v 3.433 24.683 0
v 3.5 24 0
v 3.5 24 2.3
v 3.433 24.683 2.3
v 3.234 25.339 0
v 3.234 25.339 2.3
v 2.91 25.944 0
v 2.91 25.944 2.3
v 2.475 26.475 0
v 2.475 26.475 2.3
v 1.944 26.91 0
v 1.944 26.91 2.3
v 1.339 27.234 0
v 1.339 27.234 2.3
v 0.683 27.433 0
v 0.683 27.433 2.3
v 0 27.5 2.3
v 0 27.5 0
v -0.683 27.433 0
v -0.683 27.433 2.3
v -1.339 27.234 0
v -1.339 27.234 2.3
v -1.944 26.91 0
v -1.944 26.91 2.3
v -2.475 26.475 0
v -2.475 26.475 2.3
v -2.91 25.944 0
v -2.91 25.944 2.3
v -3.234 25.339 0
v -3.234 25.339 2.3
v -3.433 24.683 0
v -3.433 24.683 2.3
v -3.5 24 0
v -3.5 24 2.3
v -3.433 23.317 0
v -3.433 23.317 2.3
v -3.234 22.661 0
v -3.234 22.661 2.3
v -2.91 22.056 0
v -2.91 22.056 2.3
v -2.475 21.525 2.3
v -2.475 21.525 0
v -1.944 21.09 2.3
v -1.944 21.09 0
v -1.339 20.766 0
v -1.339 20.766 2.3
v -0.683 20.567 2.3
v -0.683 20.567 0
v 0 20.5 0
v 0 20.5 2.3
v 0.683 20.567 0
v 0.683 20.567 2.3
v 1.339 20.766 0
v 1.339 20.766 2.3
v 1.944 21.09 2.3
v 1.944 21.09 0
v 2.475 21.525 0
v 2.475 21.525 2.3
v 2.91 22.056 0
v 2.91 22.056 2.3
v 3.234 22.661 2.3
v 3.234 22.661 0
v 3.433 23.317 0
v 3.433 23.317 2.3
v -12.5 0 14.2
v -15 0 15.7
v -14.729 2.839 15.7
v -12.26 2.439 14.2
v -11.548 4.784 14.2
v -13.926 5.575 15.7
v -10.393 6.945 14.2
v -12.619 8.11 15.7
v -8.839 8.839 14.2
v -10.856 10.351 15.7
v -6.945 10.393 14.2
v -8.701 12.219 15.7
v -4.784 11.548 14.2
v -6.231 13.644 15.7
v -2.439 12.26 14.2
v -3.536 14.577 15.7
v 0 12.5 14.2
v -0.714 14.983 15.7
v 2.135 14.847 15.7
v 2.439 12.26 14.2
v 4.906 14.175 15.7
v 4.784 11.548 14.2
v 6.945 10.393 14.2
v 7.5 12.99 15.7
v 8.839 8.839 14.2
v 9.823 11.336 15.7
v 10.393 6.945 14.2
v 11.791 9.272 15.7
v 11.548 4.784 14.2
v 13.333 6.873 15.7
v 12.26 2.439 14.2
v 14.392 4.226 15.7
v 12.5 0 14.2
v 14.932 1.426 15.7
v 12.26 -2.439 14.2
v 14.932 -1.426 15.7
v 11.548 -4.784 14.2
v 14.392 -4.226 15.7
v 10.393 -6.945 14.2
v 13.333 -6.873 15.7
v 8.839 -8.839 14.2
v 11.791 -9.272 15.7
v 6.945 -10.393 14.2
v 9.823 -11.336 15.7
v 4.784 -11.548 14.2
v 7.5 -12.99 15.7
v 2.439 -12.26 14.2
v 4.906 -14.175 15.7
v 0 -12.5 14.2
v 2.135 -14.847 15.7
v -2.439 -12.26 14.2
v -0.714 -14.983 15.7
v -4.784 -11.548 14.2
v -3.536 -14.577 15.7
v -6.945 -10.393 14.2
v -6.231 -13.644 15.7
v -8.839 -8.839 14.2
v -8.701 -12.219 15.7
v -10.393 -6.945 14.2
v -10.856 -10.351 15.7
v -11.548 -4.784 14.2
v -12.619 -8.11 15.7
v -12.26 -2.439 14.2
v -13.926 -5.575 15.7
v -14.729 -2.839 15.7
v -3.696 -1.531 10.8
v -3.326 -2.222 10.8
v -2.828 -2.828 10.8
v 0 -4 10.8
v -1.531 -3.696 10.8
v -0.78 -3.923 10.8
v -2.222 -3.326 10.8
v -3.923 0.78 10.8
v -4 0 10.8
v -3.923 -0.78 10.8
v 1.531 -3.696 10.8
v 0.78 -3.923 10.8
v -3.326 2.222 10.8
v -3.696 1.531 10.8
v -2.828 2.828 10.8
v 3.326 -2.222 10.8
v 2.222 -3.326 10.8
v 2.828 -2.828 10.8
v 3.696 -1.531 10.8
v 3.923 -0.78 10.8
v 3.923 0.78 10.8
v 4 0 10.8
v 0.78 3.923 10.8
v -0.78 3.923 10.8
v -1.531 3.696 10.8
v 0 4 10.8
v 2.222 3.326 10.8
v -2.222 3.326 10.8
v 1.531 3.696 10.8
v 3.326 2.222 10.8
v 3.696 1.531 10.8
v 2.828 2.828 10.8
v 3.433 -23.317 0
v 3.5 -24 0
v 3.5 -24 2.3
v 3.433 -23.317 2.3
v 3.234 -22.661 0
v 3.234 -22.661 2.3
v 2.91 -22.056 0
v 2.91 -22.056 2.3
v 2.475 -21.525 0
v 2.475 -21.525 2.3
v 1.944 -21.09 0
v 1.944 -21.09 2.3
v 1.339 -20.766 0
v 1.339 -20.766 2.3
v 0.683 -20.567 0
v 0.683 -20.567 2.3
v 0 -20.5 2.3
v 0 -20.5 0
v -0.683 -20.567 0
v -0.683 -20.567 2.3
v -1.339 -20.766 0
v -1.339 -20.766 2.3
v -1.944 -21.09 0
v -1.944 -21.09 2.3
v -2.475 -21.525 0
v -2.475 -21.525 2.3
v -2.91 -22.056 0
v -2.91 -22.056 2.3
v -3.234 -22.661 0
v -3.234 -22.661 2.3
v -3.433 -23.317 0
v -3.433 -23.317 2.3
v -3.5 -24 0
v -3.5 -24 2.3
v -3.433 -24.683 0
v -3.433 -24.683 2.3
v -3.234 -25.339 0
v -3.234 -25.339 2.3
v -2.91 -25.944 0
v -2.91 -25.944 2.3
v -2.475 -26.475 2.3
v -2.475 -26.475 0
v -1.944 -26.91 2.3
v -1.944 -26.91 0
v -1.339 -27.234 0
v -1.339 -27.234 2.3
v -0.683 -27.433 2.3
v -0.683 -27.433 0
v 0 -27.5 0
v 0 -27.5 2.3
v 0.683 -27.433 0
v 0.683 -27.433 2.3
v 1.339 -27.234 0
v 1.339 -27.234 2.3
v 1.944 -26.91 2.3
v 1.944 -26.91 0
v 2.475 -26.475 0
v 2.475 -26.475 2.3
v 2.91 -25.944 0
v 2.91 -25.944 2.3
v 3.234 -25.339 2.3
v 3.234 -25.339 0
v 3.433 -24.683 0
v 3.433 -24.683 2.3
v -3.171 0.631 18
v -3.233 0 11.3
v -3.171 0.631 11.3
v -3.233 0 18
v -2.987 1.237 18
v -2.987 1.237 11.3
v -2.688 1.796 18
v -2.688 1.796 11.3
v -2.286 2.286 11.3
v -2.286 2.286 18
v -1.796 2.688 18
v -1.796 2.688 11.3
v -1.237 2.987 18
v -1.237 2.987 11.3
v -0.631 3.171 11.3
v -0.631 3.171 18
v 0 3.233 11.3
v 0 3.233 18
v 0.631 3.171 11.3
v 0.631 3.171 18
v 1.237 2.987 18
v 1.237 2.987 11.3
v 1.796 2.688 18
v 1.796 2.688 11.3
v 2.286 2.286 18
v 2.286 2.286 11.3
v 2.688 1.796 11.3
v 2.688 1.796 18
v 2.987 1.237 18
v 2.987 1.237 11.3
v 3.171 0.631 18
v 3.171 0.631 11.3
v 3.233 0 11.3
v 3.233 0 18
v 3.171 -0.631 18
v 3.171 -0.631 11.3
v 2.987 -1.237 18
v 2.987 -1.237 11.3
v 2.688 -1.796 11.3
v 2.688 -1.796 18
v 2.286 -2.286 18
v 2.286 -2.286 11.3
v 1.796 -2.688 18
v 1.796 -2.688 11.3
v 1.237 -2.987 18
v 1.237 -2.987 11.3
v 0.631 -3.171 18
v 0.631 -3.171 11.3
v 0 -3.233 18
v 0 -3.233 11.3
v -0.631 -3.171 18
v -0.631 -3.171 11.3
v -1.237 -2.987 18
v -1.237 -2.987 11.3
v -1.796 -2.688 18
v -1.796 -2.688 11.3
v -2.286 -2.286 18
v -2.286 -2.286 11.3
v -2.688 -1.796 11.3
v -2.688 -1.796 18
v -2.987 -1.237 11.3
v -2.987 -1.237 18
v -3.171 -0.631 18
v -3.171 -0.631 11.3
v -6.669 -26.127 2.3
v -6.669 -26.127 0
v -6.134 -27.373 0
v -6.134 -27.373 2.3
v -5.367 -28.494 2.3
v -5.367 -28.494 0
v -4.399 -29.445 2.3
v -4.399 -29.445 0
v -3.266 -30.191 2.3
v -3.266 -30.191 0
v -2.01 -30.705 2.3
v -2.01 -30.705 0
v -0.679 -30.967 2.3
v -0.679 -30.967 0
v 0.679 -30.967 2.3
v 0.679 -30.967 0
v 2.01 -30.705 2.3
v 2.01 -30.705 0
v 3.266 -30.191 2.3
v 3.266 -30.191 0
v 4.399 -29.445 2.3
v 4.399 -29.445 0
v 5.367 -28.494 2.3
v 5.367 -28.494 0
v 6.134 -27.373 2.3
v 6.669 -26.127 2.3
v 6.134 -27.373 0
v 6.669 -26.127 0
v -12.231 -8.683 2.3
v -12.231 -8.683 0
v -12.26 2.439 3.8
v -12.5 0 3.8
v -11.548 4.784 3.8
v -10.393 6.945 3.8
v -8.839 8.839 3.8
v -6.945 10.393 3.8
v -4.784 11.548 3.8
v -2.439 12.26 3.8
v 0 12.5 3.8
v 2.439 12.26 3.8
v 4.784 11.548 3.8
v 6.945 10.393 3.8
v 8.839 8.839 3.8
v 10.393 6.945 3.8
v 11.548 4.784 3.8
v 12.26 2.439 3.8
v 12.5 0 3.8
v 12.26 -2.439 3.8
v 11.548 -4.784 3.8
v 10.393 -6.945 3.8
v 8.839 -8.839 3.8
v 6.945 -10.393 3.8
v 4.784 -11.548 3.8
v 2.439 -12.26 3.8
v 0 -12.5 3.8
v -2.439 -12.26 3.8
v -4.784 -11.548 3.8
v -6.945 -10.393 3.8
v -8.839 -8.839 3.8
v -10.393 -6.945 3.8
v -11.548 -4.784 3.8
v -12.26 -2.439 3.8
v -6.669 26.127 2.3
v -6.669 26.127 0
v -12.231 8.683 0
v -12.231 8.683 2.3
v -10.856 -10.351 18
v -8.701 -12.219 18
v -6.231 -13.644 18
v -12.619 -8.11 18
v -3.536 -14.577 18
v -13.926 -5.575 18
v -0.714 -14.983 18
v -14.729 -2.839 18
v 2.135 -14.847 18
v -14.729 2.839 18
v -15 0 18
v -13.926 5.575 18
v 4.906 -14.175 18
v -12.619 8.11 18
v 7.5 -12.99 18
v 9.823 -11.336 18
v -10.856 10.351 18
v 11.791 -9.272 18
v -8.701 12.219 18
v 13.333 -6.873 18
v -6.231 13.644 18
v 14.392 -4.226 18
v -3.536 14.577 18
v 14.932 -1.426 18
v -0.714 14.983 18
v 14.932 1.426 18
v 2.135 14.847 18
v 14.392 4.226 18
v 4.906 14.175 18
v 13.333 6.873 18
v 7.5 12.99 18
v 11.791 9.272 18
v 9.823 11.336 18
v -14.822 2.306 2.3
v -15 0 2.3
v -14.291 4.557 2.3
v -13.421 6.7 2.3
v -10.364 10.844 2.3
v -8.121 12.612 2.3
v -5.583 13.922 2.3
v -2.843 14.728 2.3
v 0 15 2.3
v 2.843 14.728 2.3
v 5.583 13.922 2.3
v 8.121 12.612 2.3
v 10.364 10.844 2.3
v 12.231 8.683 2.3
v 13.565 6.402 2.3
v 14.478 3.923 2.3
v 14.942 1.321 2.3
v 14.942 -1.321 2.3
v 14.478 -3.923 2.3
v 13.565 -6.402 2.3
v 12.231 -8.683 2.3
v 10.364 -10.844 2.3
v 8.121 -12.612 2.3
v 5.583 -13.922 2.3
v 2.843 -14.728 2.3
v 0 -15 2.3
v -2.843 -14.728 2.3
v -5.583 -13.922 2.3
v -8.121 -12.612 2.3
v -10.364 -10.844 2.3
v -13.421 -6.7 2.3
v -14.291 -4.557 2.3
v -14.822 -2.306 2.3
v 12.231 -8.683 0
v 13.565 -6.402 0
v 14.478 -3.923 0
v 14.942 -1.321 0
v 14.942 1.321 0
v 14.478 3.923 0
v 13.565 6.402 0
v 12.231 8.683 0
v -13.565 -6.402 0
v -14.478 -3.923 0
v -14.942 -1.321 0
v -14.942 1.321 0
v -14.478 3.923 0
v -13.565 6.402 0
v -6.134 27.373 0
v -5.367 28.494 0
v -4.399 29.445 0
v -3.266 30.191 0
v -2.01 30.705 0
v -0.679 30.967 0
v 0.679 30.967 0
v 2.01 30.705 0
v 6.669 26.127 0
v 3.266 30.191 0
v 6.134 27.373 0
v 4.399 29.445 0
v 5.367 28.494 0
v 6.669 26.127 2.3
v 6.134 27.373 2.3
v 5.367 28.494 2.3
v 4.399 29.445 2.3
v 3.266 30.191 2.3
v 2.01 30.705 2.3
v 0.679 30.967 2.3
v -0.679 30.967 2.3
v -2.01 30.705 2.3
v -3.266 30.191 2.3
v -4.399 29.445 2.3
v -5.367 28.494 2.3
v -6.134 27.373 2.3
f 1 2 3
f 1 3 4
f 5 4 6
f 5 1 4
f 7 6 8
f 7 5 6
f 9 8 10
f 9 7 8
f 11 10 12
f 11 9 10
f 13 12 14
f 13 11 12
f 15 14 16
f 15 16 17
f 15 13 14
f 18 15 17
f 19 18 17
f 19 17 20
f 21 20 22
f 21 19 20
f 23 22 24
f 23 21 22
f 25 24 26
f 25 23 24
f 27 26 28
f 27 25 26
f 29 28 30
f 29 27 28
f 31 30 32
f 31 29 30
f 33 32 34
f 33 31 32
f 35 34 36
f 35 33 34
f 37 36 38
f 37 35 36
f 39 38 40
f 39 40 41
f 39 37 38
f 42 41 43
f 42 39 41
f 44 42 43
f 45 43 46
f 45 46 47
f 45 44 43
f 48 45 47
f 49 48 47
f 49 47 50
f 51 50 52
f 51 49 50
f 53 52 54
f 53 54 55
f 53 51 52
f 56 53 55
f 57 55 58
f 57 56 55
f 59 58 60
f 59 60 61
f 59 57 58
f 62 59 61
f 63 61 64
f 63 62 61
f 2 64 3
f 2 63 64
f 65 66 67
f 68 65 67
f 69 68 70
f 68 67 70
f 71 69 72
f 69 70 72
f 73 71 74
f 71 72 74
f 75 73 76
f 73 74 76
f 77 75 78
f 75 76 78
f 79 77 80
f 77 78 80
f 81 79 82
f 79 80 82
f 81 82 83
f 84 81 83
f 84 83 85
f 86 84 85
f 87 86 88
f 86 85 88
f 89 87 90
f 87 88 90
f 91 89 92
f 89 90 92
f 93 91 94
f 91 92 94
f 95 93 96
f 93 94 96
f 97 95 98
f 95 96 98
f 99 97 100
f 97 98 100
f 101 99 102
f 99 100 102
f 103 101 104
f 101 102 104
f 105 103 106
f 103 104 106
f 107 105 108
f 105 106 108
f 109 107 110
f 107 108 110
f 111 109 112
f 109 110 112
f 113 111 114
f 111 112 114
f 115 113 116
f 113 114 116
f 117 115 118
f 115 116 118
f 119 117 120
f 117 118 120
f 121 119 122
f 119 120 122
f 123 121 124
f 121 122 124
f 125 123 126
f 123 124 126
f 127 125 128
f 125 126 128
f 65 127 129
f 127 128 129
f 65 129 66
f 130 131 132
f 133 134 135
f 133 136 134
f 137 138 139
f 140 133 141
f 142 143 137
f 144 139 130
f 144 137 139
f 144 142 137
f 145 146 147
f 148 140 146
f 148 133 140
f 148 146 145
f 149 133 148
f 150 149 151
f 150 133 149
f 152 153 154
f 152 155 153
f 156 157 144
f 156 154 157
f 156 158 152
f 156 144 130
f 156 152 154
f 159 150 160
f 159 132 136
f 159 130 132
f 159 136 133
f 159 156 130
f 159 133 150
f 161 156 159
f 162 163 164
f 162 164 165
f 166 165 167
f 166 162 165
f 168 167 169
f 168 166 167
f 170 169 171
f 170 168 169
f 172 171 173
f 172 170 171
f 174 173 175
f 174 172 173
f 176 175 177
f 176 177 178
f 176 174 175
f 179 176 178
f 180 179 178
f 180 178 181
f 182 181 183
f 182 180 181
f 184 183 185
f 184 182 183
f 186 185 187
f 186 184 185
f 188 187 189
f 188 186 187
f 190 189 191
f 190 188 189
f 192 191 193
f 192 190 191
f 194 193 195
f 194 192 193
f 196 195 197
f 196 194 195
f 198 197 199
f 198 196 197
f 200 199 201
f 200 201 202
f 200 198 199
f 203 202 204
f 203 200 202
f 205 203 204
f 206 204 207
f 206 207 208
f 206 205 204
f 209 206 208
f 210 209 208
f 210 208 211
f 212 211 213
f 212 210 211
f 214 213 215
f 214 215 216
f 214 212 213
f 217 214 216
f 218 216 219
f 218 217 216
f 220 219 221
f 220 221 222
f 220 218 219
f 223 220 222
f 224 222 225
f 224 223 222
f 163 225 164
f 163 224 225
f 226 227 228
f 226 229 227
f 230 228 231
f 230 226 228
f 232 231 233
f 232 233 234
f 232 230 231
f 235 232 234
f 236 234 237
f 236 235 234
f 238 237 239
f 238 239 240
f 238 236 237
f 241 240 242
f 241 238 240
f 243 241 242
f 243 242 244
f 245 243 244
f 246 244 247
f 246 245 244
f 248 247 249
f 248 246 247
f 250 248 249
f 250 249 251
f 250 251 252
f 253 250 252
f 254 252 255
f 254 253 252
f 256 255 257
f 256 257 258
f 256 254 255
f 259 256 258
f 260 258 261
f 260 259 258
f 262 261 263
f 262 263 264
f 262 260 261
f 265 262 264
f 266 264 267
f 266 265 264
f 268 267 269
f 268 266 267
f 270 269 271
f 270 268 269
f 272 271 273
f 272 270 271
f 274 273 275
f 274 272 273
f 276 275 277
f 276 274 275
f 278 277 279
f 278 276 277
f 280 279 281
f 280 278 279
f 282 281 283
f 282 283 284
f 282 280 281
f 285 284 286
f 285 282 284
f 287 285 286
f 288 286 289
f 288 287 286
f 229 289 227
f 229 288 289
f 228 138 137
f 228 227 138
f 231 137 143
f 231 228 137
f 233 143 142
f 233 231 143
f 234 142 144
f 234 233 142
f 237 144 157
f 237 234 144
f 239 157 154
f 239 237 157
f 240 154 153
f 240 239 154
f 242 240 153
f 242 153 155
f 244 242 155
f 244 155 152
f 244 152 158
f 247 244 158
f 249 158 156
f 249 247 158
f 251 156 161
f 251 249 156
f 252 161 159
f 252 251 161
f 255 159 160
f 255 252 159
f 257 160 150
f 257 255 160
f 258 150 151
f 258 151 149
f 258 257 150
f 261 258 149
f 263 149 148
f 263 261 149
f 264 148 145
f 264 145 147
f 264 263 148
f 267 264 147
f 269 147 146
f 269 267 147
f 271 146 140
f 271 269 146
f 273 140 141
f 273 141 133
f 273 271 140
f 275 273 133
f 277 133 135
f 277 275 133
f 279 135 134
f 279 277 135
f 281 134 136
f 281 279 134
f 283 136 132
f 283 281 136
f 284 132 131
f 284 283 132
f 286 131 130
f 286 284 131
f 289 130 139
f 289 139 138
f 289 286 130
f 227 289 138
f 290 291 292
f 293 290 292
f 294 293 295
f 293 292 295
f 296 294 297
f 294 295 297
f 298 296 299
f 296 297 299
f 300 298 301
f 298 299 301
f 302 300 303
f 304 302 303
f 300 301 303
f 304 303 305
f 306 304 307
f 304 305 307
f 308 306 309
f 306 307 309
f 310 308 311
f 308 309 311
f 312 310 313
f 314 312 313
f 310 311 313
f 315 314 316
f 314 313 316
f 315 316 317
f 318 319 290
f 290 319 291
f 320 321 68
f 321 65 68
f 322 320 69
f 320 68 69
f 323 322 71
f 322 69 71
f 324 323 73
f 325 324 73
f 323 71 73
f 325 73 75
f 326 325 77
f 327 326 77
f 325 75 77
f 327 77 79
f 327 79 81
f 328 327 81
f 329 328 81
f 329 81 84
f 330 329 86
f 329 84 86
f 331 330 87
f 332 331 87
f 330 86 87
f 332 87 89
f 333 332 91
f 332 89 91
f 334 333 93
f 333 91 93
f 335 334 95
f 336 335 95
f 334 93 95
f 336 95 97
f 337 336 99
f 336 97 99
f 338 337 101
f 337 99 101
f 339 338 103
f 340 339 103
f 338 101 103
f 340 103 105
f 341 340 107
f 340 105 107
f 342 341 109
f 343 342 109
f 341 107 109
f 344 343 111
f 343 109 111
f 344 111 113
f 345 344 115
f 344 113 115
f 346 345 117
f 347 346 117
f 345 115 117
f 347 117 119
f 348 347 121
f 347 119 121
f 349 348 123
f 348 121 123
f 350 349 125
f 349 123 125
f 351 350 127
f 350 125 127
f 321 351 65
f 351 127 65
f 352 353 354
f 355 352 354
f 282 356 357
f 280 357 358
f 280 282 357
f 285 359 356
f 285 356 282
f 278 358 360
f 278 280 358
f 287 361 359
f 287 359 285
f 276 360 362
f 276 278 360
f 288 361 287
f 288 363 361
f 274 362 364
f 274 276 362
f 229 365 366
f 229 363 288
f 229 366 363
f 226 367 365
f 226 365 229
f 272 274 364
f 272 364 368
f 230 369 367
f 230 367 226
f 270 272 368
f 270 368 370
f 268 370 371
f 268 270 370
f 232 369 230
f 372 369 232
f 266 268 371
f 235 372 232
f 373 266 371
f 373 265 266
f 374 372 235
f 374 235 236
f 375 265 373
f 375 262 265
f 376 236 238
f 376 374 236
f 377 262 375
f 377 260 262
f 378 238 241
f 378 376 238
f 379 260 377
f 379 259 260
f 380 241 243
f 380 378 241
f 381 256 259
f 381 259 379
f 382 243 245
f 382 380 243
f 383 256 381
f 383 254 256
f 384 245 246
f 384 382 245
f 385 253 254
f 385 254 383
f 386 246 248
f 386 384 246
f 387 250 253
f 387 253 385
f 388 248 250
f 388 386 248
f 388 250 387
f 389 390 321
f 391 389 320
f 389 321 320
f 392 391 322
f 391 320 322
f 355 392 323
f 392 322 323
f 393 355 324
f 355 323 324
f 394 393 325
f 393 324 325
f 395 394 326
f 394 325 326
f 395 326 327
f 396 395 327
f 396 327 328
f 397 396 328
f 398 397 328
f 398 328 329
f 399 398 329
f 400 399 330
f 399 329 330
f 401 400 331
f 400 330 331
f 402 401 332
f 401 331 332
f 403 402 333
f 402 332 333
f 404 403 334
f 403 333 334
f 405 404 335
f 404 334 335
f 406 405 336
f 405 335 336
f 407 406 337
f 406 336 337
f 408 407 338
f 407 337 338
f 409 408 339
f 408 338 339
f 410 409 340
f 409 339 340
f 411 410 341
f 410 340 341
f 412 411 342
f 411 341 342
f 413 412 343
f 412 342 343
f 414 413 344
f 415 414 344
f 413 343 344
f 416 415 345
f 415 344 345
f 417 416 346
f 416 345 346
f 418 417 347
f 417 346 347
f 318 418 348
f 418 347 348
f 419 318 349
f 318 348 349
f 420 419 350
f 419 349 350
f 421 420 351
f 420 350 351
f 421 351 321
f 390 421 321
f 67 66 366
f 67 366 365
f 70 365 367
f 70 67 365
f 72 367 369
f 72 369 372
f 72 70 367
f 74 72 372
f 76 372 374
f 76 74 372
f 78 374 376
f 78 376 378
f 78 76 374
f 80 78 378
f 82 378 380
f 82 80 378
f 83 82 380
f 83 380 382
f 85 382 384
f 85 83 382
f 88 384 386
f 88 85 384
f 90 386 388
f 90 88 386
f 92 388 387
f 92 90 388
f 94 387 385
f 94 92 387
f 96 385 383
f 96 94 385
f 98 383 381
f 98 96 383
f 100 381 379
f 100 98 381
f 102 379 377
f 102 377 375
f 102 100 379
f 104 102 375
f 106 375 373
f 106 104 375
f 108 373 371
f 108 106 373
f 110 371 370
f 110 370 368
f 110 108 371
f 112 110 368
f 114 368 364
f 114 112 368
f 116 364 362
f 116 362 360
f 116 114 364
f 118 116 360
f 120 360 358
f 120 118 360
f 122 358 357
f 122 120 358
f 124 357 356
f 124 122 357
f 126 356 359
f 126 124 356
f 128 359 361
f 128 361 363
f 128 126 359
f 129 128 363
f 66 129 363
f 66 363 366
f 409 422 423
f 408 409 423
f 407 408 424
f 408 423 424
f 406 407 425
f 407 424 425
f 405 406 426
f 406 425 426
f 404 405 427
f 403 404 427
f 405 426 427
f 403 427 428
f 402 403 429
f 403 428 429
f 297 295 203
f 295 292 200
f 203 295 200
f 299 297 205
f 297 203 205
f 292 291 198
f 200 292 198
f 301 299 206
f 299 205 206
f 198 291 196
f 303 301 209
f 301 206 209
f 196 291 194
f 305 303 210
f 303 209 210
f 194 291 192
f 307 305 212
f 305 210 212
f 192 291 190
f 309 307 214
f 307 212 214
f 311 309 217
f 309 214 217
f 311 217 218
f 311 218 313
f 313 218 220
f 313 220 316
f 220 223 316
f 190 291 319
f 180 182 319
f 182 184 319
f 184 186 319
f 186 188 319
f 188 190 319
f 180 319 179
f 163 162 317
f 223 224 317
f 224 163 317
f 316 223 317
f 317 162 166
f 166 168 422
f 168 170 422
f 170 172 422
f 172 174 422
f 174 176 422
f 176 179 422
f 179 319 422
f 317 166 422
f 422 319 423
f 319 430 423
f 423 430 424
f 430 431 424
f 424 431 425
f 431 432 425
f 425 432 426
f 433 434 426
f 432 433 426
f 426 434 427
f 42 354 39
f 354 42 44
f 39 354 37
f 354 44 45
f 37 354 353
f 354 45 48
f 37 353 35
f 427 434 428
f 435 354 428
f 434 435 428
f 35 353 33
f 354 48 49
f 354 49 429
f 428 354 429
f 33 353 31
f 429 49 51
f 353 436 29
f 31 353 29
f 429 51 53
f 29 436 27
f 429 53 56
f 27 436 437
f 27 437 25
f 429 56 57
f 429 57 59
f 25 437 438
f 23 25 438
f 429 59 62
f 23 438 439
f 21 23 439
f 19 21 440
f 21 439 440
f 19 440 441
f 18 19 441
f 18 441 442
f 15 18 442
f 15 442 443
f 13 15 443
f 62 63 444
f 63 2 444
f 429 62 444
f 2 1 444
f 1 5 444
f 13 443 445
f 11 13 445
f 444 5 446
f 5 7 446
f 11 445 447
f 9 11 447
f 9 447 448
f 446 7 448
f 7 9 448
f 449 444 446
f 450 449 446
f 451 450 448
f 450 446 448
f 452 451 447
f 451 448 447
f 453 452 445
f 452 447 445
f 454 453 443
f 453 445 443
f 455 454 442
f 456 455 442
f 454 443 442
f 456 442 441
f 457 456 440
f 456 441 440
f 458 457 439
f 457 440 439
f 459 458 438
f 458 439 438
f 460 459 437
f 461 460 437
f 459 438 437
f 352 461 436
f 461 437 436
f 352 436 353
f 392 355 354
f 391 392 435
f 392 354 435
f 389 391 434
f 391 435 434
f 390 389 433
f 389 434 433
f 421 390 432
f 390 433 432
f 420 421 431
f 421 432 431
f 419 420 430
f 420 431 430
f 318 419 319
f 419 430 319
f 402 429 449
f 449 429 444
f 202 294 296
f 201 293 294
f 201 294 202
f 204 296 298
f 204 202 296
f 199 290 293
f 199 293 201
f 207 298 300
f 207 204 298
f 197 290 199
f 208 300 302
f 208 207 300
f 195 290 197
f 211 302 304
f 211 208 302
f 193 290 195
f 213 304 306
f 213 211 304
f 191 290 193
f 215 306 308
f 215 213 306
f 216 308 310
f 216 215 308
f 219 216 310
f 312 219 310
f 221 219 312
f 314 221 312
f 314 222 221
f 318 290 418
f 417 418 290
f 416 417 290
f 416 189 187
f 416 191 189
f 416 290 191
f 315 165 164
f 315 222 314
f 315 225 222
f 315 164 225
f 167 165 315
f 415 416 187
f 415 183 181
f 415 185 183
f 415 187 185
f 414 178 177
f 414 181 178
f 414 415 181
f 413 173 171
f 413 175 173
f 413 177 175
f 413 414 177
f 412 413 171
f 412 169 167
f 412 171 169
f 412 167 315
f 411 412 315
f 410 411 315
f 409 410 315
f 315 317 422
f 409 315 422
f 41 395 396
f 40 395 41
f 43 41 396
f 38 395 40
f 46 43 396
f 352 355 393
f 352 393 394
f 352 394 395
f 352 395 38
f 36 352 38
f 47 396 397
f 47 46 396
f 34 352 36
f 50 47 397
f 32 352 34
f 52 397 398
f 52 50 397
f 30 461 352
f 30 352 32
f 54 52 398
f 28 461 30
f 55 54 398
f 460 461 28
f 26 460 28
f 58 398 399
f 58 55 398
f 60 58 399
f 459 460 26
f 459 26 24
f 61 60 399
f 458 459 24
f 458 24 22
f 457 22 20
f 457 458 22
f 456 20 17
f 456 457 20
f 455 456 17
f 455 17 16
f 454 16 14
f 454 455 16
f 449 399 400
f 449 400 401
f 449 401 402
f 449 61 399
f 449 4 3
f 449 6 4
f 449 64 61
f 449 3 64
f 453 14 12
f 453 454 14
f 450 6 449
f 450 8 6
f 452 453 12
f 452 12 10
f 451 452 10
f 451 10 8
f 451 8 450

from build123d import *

# Parameters (mm, degrees)
SKETCH_1_R      = 3.5
EXTRUDE_1_DEPTH = 2.3
SKETCH_3_W      = 15
SKETCH_3_H      = 2.3


with BuildPart() as part:
    # 草图1 → 凸台-拉伸1 (new body)
    with BuildSketch(Plane.XY):
        with BuildLine():
            Line((-12.231269749, -8.683089331), (-6.66916341, -26.126560465))
            ThreePointArc((-6.66916341, -26.126560465), (0, -31), (6.66916341, -26.126560465))
            Line((6.66916341, -26.126560465), (12.231269749, -8.683089331))
            ThreePointArc((12.231269749, -8.683089331), (15, 0), (12.231269749, 8.683089331))
            Line((12.231269749, 8.683089331), (6.66916341, 26.126560465))
            ThreePointArc((6.66916341, 26.126560465), (0, 31), (-6.66916341, 26.126560465))
            Line((-6.66916341, 26.126560465), (-12.231269749, 8.683089331))
            ThreePointArc((-12.231269749, 8.683089331), (-15, 0), (-12.231269749, -8.683089331))
        make_face()
        with Locations((0, -24)):
            Circle(SKETCH_1_R, mode=Mode.SUBTRACT)
        with Locations((0, 24)):
            Circle(SKETCH_1_R, mode=Mode.SUBTRACT)
    extrude(amount=EXTRUDE_1_DEPTH)

    # 草图2 → 旋转1 (revolve)
    with BuildSketch(Plane(origin=(0, 0, 0), x_dir=(1, 0, 0), z_dir=(0, 1, 0)), mode=Mode.PRIVATE) as revolve_1_sk:
        Polygon((0, -2.3), (15, -2.3), (12.5, -3.8), (12.5, -14.2), (15, -15.7), (0, -15.7), align=None)
    revolve(revolve_1_sk.sketch.rotate(Axis((0, 0, 15.7), (0, 0, -1)), 180), axis=Axis((0, 0, 15.7), (0, 0, -1)))

    # 草图3 → 旋转2 (revolve)
    with BuildSketch(Plane(origin=(0, 0, 0), x_dir=(1, 0, 0), z_dir=(0, 1, 0)), mode=Mode.PRIVATE) as revolve_2_sk:
        with Locations((7.5, -16.85)):
            Rectangle(SKETCH_3_W, SKETCH_3_H)
    revolve(revolve_2_sk.sketch.rotate(Axis((0, 0, 18), (0, 0, -1)), 180), axis=Axis((0, 0, 18), (0, 0, -1)))

    # 草图4 → 切除-旋转1 (revolve, cut)
    with BuildSketch(Plane(origin=(0, 0, 0), x_dir=(1, 0, 0), z_dir=(0, 1, 0)), mode=Mode.PRIVATE) as cut_revolve_1_sk:
        Polygon((0, -10.8), (4, -10.8), (3.233, -11.3), (3.233, -18), (0, -18), align=None)
    revolve(cut_revolve_1_sk.sketch.rotate(Axis((0, 0, 18), (0, 0, -1)), 180), axis=Axis((0, 0, 18), (0, 0, -1)), mode=Mode.SUBTRACT)


solid = part.part
